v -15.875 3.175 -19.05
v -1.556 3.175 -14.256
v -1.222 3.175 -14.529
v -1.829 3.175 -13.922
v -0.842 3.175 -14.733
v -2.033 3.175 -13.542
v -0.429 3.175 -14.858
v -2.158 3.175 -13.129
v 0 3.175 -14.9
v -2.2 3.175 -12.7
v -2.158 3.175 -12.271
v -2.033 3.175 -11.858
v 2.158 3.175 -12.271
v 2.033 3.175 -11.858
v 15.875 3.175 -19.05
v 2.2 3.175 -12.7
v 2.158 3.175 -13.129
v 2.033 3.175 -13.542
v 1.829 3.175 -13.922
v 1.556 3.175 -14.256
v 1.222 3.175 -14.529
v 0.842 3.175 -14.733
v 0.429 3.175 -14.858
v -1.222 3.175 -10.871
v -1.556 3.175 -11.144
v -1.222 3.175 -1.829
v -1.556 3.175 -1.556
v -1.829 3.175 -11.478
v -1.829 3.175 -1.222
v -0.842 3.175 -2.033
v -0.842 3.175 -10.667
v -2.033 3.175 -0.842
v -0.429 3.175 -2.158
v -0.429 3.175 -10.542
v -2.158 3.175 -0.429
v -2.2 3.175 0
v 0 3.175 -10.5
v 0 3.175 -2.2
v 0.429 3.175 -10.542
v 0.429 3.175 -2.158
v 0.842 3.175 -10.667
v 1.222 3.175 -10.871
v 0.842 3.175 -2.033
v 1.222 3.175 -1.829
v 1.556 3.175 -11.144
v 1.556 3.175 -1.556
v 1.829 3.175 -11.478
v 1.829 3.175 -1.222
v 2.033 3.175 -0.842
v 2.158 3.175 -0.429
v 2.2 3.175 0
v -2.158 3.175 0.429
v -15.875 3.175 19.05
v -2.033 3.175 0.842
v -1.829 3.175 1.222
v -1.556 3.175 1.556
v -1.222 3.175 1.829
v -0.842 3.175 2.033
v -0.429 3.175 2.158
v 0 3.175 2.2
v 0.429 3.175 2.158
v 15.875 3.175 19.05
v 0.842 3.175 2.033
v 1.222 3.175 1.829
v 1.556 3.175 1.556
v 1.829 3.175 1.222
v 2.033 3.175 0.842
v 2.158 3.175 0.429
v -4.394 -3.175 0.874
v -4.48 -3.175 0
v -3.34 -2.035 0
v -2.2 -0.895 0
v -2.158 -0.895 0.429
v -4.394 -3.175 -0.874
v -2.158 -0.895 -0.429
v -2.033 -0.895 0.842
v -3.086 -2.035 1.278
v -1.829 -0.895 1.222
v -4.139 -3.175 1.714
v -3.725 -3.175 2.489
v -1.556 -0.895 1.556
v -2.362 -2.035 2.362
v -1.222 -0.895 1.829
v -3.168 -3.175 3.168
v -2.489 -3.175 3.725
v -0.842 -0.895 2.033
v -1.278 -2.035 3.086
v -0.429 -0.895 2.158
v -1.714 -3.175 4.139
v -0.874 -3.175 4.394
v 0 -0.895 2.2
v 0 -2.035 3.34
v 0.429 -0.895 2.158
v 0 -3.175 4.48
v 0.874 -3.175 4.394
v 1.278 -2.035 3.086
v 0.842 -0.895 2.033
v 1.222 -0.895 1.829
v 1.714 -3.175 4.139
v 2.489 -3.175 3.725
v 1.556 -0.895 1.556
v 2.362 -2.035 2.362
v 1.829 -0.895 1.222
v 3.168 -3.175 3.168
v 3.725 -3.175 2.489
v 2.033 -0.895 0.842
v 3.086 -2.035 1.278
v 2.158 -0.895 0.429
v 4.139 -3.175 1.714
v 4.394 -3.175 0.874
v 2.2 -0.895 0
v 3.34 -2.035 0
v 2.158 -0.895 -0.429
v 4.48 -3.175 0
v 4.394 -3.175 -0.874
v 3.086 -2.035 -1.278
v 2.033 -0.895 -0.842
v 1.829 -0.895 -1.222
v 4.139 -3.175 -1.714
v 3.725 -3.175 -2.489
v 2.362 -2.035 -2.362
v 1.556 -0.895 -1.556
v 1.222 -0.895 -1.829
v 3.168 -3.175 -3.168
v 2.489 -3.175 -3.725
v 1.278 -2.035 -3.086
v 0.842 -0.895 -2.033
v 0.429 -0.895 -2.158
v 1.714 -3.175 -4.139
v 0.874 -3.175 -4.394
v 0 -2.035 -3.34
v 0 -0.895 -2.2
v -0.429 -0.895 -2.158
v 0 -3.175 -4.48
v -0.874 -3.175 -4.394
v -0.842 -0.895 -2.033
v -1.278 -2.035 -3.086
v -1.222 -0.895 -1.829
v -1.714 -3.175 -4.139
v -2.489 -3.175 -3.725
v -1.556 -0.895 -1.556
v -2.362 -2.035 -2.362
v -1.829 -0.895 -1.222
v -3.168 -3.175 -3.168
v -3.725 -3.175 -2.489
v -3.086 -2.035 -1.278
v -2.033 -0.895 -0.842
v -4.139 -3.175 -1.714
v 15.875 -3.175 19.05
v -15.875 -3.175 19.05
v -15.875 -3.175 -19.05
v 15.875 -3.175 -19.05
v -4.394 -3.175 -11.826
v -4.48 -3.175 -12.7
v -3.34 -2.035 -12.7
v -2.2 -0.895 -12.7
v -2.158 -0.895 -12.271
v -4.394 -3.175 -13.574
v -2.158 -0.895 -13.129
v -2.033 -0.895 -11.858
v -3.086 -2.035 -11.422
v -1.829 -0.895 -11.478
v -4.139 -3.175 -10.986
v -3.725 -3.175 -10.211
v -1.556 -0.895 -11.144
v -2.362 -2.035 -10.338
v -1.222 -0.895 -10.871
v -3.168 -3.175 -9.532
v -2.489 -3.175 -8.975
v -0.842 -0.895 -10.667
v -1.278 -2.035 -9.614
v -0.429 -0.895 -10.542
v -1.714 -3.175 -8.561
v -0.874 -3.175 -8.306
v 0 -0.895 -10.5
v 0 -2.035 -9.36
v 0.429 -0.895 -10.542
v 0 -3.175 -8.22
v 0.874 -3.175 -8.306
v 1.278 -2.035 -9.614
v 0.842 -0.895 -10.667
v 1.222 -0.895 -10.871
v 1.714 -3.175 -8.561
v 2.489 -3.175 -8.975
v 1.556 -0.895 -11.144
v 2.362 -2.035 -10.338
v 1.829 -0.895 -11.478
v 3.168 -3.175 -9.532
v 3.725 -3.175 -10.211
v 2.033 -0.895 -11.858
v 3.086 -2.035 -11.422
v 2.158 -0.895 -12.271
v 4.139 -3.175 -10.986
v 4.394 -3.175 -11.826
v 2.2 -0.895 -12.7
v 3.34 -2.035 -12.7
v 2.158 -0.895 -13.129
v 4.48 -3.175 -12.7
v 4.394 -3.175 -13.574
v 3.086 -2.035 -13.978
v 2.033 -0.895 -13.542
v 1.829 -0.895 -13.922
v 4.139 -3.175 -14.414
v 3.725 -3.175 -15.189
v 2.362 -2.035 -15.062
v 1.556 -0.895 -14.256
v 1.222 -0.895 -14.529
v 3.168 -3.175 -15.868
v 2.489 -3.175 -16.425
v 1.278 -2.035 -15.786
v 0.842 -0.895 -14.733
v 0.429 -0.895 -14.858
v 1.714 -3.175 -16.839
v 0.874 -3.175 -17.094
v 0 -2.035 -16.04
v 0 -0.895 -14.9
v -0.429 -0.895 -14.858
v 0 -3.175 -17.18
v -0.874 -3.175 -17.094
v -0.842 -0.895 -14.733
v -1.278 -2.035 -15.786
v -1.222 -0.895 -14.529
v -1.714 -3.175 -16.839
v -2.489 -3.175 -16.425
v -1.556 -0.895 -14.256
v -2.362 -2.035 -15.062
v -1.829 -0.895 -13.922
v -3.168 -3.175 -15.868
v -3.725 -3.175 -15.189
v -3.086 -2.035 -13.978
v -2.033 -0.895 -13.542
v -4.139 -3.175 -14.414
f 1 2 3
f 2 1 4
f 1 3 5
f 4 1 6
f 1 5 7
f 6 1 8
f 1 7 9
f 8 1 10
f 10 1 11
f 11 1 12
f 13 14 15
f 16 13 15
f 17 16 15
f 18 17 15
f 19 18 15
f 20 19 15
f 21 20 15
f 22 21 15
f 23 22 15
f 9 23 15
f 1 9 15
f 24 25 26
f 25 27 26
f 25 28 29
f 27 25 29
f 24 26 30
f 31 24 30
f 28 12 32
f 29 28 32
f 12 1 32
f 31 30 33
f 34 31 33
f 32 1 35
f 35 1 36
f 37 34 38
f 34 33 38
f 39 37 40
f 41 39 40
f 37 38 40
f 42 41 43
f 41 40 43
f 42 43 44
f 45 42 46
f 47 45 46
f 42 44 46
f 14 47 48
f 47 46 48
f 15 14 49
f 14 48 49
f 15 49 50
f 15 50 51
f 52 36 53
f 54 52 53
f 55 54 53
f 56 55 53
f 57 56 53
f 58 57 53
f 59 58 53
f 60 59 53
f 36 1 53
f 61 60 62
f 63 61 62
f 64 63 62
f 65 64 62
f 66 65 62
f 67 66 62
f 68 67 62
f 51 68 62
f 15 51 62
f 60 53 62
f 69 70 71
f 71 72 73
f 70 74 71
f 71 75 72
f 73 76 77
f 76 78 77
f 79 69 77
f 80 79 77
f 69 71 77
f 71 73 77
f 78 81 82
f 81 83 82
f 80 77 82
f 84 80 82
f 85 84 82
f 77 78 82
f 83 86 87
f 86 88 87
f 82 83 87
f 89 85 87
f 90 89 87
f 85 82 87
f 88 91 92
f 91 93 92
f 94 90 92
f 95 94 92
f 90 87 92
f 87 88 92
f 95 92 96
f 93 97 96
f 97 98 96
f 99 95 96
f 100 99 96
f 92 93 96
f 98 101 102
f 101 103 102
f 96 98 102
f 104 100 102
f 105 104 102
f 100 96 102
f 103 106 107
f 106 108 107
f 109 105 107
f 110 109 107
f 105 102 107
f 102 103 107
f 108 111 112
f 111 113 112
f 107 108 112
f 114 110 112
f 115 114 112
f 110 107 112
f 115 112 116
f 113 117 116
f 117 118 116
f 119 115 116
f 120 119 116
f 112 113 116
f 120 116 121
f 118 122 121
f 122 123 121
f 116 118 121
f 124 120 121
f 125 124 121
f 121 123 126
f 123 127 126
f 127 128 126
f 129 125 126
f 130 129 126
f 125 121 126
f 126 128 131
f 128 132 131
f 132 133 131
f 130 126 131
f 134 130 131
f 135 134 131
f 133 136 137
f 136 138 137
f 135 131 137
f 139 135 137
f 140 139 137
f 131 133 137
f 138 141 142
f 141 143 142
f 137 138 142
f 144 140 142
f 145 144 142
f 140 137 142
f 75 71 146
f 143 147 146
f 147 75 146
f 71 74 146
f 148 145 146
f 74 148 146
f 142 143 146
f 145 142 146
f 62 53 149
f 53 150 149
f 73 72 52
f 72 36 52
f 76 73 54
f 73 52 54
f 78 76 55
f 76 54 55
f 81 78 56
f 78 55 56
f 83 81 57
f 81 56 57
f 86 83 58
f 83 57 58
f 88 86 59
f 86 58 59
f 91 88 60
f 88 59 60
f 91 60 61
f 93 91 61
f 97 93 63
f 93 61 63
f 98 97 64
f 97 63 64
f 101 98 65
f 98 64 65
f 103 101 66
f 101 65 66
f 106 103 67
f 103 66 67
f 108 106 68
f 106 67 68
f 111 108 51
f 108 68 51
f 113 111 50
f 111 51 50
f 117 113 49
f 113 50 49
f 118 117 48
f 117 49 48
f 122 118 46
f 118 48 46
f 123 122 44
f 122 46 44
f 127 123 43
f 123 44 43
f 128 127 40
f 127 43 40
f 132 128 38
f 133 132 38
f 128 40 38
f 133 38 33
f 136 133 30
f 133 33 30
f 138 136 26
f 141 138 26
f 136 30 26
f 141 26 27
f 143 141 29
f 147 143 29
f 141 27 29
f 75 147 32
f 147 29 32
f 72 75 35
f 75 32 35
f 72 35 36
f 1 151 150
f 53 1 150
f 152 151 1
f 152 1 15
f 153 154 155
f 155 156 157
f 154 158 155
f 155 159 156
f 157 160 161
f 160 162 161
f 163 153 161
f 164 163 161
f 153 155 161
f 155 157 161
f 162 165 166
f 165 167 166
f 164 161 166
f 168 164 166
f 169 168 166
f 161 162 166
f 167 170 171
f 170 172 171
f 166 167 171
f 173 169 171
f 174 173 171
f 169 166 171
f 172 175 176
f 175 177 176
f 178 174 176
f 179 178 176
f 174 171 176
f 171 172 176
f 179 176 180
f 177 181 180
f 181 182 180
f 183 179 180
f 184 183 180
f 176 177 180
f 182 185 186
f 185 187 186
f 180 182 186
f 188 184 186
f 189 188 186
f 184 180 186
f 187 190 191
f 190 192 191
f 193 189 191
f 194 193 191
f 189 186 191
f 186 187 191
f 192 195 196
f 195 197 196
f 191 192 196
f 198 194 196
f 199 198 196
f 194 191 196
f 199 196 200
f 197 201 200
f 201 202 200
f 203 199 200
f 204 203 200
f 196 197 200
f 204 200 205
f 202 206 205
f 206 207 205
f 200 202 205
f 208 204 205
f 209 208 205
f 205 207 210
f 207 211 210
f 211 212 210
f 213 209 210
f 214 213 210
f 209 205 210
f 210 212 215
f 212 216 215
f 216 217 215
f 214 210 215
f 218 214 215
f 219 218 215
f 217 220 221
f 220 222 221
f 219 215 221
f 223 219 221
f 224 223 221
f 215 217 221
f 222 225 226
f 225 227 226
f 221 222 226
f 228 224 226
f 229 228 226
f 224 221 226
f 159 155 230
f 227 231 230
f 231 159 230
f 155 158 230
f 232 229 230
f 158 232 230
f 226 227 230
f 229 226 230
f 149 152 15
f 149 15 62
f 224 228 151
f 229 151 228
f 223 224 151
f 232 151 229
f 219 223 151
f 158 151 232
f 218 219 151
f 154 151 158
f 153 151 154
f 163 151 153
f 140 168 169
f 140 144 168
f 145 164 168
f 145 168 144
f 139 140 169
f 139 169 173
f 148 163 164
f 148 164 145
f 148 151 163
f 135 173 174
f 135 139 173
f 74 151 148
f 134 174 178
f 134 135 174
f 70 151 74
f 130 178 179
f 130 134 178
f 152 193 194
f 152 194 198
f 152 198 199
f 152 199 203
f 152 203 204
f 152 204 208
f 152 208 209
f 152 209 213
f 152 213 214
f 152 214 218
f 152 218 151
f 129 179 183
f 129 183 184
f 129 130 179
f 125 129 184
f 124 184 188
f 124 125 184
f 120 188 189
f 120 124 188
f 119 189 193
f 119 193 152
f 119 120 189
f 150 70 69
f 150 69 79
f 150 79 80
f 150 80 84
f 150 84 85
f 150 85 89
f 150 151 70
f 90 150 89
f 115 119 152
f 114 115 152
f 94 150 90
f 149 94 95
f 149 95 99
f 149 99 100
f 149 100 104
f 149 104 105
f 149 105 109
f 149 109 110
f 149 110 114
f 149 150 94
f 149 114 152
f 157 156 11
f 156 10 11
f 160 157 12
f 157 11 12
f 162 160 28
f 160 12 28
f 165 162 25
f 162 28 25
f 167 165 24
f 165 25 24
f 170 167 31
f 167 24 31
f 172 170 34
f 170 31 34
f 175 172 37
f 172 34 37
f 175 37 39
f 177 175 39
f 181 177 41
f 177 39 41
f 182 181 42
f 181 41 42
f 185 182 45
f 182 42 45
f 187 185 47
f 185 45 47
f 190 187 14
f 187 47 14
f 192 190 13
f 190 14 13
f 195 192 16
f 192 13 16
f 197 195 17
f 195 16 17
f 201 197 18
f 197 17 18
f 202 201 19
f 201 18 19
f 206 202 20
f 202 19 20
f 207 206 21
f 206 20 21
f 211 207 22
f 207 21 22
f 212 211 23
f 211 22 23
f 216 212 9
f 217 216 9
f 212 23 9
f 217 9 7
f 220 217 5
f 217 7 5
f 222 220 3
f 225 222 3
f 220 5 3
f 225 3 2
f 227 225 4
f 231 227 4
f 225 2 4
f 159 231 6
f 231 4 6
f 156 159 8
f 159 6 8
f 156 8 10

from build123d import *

# Parameters (mm, degrees)
F0_W           = 31.75
F0_H           = 38.1
F1_DEPTH       = 3.175
F3_D           = 4.4
F3_DEPTH       = 12.7
F3_CSINK_D     = 8.96
F3_CSINK_ANGLE = 90
F3_TIP         = 1.3218933619


with BuildPart() as f1:
    # F0 (on Front) → F1 (new body, symmetric)
    with BuildSketch(Plane.XZ):
        Rectangle(F0_W, F0_H)
    extrude(amount=F1_DEPTH, both=True)

    # F3
    with Locations(Plane.XZ.offset(3.175)):
        with Locations((0, 0), (0, -12.7)):
            CounterSinkHole(F3_D / 2, F3_CSINK_D / 2, depth=F3_DEPTH, counter_sink_angle=F3_CSINK_ANGLE)
            with Locations((0, 0, -(F3_DEPTH + F3_TIP / 2))):  # 118° drill point
                Cone(0, F3_D / 2, F3_TIP, mode=Mode.SUBTRACT)


solid = f1.part
